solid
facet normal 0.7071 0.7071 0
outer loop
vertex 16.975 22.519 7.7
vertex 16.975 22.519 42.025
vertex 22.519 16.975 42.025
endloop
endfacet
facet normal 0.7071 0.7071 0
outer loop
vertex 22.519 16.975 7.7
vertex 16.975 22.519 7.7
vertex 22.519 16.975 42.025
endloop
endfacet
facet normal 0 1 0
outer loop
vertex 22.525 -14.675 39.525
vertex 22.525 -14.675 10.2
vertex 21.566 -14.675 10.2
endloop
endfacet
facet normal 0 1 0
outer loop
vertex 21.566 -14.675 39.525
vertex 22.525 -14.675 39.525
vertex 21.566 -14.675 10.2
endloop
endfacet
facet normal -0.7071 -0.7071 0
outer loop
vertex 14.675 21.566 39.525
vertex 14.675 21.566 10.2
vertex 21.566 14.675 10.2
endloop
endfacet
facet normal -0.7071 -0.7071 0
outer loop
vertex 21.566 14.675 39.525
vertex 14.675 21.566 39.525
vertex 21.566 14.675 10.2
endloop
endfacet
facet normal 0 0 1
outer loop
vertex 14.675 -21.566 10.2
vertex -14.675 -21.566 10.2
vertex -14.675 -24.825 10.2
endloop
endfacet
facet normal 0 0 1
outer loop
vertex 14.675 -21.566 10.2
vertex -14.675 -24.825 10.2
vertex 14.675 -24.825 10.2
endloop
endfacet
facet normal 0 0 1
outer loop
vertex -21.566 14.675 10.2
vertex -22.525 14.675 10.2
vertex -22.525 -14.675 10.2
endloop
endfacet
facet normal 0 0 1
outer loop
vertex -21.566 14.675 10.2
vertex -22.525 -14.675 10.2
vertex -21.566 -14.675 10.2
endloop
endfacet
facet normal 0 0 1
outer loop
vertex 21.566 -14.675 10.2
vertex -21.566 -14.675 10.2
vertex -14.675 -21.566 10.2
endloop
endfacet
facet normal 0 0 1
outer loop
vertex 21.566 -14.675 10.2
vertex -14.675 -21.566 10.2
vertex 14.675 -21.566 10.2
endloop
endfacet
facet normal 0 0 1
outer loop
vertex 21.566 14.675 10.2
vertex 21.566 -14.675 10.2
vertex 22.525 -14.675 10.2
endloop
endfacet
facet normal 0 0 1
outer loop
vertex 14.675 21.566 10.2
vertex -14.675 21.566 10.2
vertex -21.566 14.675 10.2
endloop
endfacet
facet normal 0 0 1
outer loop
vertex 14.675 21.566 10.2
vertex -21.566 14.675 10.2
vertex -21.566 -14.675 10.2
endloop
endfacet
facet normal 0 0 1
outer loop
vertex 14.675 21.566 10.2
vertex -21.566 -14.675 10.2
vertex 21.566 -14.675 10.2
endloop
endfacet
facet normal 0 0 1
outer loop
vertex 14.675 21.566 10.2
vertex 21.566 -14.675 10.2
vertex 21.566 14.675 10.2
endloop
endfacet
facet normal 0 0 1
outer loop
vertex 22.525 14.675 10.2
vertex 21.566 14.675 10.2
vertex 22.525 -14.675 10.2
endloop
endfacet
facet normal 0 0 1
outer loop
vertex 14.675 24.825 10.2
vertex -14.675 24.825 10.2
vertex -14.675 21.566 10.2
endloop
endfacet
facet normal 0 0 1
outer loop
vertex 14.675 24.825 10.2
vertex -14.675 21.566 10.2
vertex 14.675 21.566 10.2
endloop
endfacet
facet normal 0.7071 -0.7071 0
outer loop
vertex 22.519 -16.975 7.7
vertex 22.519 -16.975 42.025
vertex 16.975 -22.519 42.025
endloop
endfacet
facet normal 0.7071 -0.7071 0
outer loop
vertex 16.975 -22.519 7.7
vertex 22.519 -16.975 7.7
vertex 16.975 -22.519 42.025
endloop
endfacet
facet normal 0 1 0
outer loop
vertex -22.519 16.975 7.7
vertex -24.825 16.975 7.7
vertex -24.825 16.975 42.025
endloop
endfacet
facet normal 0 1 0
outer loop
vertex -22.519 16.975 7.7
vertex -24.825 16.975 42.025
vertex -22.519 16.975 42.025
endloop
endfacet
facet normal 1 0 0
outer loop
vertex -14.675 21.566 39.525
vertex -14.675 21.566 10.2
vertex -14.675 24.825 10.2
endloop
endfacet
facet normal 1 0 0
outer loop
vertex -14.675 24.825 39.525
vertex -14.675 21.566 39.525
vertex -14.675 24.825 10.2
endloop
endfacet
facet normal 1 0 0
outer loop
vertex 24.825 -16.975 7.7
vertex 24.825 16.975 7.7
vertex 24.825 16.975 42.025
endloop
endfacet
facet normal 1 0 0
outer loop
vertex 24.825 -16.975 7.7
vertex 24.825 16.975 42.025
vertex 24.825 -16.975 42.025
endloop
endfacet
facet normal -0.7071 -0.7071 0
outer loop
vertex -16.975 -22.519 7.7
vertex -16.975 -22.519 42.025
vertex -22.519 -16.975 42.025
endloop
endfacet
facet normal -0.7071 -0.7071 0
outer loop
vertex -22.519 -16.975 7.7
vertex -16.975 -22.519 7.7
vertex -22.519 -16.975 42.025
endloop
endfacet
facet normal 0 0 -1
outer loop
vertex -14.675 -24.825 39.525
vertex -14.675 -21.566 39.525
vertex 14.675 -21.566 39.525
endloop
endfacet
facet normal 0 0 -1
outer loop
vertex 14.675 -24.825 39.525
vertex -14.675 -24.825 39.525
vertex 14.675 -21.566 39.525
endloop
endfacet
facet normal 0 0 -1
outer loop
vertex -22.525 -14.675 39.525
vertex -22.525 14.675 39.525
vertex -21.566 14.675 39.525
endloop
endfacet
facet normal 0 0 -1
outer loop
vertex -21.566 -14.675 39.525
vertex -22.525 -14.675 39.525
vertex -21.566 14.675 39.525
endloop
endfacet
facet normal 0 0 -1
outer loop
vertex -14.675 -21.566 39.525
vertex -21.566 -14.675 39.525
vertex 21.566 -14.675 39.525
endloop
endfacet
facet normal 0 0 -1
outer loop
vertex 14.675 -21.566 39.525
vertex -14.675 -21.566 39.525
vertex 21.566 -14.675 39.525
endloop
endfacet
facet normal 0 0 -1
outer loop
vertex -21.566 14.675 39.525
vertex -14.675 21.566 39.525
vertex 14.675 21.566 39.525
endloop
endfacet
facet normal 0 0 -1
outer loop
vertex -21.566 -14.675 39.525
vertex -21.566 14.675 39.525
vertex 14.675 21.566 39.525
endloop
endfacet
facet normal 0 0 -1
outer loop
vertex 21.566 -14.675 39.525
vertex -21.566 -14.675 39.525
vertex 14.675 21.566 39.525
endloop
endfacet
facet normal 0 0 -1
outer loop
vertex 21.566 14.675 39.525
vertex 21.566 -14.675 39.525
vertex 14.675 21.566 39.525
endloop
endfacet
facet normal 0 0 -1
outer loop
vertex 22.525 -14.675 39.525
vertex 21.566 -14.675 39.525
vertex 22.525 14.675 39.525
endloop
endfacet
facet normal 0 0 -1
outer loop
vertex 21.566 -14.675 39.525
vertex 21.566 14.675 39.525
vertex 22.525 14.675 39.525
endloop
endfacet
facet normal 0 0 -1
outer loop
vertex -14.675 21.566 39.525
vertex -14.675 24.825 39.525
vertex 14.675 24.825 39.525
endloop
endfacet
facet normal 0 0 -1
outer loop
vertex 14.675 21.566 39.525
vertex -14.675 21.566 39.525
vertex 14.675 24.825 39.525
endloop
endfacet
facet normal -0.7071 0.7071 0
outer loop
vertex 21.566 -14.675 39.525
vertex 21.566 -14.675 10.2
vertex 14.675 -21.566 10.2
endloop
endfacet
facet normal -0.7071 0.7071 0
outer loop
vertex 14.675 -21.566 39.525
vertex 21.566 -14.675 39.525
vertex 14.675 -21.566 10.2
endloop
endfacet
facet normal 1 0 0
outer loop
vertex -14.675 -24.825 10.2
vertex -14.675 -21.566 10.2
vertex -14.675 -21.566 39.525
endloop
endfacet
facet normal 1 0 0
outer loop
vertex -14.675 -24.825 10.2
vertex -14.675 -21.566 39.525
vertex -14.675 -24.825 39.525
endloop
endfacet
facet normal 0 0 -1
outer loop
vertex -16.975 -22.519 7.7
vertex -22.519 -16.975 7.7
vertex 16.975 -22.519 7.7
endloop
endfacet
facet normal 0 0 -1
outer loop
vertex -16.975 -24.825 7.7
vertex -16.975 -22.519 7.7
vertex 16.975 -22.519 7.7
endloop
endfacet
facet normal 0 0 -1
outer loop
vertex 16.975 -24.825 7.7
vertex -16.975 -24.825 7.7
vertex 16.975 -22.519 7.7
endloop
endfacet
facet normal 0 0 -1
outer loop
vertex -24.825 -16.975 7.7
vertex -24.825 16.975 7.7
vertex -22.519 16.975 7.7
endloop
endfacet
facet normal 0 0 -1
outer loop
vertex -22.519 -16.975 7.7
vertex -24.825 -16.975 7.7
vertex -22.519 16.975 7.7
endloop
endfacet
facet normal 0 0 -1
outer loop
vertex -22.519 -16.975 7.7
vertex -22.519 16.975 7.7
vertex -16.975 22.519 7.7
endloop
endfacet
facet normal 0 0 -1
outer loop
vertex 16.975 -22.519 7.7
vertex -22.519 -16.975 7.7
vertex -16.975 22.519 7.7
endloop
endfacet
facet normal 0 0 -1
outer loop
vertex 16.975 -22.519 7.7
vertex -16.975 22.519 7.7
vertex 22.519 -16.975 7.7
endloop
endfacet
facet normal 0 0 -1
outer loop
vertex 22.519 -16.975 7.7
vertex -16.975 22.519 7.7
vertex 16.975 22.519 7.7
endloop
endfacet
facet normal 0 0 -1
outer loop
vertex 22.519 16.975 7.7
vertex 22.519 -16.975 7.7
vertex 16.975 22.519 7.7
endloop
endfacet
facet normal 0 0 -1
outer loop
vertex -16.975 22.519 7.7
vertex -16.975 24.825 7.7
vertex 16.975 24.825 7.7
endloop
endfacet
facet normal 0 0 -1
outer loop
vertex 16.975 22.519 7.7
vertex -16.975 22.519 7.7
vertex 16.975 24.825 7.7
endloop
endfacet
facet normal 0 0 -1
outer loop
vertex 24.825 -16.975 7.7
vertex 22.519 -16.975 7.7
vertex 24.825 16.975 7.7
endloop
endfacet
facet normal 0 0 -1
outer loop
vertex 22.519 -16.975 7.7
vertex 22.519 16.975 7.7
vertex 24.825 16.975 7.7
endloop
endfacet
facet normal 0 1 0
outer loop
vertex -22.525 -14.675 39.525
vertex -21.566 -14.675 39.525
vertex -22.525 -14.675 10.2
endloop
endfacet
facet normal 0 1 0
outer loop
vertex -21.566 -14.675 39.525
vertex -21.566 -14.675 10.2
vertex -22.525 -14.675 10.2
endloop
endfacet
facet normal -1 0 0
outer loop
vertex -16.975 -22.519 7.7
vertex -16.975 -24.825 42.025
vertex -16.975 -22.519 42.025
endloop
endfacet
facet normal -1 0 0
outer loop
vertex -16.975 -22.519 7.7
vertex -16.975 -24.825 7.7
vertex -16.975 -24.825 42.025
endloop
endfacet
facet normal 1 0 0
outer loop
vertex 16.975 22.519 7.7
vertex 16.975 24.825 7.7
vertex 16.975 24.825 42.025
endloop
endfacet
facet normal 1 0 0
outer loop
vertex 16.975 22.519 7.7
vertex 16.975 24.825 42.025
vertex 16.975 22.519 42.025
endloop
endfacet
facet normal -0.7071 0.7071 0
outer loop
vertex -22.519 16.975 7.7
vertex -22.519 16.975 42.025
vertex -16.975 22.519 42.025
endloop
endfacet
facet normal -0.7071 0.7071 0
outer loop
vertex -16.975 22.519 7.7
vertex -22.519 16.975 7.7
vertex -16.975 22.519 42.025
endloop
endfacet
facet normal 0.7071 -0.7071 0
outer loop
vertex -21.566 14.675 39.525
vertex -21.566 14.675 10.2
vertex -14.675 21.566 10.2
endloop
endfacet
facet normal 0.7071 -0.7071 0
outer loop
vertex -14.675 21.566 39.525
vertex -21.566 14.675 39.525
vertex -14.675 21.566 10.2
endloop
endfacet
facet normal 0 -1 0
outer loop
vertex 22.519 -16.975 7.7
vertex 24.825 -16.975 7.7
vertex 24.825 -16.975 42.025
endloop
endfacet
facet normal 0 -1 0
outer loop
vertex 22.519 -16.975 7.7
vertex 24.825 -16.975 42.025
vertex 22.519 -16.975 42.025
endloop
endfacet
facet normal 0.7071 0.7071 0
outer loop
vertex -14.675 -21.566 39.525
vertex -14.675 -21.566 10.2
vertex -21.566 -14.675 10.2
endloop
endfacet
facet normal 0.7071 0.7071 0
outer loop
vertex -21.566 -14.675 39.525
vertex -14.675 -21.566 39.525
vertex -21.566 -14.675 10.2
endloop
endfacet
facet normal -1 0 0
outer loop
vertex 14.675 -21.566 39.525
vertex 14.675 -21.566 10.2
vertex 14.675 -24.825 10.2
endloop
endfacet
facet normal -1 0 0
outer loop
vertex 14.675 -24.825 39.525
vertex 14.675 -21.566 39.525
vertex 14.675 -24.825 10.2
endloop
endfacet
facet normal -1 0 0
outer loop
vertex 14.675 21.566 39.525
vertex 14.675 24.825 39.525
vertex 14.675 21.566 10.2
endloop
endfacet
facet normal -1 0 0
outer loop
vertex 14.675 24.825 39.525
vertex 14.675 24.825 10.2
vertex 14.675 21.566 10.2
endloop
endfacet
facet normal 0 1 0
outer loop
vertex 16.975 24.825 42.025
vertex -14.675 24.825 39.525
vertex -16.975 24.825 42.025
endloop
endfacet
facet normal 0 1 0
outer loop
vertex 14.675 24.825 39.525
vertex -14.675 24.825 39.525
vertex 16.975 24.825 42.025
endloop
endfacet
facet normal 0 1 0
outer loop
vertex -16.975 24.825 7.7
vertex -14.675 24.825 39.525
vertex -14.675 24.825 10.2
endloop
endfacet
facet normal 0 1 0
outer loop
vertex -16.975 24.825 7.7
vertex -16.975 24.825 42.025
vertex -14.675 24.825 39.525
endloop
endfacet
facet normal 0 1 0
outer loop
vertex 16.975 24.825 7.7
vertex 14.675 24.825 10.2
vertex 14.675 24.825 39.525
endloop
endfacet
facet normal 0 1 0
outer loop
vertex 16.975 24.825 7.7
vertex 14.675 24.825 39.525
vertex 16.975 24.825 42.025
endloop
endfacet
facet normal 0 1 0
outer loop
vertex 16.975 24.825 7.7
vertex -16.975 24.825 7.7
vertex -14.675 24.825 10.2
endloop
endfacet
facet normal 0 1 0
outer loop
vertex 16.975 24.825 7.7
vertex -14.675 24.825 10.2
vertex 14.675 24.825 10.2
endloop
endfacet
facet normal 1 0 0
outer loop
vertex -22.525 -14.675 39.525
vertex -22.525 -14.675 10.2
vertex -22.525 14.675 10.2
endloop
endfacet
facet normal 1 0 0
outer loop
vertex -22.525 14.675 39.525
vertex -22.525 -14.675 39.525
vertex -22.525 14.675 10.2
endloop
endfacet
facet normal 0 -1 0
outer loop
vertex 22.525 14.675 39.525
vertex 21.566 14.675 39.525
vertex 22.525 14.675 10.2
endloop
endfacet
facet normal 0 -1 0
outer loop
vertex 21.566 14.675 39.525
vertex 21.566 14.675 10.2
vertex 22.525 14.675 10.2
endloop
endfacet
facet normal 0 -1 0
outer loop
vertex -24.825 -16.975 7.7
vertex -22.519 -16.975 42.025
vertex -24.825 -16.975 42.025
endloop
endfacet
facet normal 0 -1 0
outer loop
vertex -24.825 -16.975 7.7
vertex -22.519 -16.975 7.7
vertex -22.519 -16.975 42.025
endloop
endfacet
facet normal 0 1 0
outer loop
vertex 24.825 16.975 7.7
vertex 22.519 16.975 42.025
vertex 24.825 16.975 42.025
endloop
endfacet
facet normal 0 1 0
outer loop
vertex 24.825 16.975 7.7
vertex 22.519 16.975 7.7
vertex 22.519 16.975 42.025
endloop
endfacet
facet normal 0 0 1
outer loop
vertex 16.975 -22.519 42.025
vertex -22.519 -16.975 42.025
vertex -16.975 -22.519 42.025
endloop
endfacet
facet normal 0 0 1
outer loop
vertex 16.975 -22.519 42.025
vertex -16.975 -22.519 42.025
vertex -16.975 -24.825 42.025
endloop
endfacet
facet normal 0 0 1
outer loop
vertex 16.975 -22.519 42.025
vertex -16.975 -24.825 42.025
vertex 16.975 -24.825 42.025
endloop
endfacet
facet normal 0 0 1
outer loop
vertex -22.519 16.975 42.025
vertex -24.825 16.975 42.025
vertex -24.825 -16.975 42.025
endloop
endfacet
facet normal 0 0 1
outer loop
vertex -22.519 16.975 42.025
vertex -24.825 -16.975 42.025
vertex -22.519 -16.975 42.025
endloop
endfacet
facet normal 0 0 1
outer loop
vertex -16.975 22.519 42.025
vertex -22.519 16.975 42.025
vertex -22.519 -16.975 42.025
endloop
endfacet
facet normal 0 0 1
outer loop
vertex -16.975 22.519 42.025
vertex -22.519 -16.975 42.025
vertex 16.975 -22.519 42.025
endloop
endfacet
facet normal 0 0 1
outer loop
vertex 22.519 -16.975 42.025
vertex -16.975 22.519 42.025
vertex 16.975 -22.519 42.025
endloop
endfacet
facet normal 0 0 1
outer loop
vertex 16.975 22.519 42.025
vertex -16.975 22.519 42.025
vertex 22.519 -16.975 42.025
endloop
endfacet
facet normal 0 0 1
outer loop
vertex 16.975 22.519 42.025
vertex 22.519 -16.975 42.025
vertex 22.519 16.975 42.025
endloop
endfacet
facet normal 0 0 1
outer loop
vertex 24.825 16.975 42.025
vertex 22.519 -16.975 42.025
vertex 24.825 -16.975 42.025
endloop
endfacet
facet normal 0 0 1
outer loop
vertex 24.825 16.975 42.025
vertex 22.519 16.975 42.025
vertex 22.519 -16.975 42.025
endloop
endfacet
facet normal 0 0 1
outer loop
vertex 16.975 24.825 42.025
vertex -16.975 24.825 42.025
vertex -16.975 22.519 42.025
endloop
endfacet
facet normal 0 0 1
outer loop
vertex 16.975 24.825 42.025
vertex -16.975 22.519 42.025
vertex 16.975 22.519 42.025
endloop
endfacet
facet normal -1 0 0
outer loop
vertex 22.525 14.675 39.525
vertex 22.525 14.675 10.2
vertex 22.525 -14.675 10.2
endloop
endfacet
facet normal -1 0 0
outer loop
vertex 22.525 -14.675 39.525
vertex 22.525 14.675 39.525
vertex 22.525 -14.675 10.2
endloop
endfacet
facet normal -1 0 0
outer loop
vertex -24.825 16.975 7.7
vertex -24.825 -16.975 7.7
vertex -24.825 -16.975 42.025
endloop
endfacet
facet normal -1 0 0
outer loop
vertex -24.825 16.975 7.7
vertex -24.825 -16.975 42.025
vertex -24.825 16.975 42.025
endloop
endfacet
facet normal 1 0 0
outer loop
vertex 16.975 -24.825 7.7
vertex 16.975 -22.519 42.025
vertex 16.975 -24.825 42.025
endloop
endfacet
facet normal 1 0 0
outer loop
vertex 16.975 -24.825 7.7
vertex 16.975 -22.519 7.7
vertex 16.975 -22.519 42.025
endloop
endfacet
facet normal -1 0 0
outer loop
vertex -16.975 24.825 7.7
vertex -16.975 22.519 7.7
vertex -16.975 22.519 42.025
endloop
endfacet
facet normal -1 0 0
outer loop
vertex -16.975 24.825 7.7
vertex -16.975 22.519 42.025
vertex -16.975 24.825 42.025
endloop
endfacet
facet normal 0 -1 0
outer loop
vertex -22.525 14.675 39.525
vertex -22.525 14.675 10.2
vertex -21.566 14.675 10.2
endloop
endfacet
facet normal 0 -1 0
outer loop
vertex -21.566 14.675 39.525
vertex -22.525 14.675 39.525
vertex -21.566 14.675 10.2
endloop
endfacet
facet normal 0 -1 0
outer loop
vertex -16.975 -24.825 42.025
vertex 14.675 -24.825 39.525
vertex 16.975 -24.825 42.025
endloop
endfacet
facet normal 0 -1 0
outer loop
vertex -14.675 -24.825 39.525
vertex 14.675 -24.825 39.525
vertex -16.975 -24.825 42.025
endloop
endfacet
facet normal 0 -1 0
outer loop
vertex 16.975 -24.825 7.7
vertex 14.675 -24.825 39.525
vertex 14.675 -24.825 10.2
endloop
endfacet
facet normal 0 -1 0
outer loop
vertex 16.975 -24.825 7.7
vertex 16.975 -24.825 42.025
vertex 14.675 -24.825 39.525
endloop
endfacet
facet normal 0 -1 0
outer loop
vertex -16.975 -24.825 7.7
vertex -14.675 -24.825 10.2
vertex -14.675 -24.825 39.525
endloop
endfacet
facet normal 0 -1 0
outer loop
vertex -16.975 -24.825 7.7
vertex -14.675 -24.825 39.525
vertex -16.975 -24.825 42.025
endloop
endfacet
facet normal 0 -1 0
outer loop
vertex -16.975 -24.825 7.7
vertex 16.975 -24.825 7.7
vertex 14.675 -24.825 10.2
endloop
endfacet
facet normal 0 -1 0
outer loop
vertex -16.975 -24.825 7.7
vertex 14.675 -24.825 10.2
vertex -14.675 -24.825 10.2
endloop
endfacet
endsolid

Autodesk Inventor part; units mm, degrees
ref_plane "YZ Plane" through (0, 0, 0) normal (1, 0, 0) x (0, 1, 0)
ref_plane "XZ Plane" through (0, 0, 0) normal (0, 1, 0) x (-1, 0, 0)
sketch "Sketch1" plane through (0, 0, 0) normal (0, 0, 1) x (1, 0, 0)
  circle A0 centre (-10, 20.9) radius 1.875 projected
  circle A1 centre (-10, -20.9) radius 1.875 projected
  circle A2 centre (10, 20.9) radius 1.875 projected
  circle A3 centre (10, -20.9) radius 1.875 projected
  circle A4 centre (20.8, -14.4) radius 2.075 projected
  circle A5 centre (20.8, 14.4) radius 2.075 projected
  circle A6 centre (-20.8, 14.4) radius 2.075 projected
  circle A7 centre (-20.8, -14.4) radius 2.075 projected
  line L0 (16.9, -16.9) -> (-16.9, -16.9) projected
  line L1 (-16.9, -16.9) -> (-16.9, 16.9) projected
  line L2 (-16.9, 16.9) -> (16.9, 16.9) projected
  line L3 (16.9, 16.9) -> (16.9, -16.9) projected
  line L4 (-17.05, 24.9) -> (-17.05, 22.55) projected
  line L5 (-17.05, 22.55) -> (-22.55, 17.05) projected
  line L6 (-22.55, 17.05) -> (-24.9, 17.05) projected
  line L7 (-24.9, 17.05) -> (-24.9, -17.05) projected
  line L8 (-24.9, -17.05) -> (-22.55, -17.05) projected
  line L9 (-22.55, -17.05) -> (-17.05, -22.55) projected
  line L10 (-17.05, -22.55) -> (-17.05, -24.9) projected
  line L11 (-17.05, -24.9) -> (17.05, -24.9) projected
  line L12 (17.05, -24.9) -> (17.05, -22.55) projected
  line L13 (17.05, -22.55) -> (22.55, -17.05) projected
  line L14 (22.55, -17.05) -> (24.9, -17.05) projected
  line L15 (24.9, -17.05) -> (24.9, 17.05) projected
  line L16 (24.9, 17.05) -> (22.55, 17.05) projected
  line L17 (22.55, 17.05) -> (17.05, 22.55) projected
  line L18 (17.05, 22.55) -> (17.05, 24.9) projected
  line L19 (17.05, 24.9) -> (-17.05, 24.9) projected
  line L20 (24.825, 16.975) -> (24.825, -16.975)
  line L21 (24.825, -16.975) -> (22.5189, -16.975)
  line L22 (22.5189, -16.975) -> (16.975, -22.5189)
  line L23 (16.975, -22.5189) -> (16.975, -24.825)
  line L24 (16.975, -24.825) -> (-16.975, -24.825)
  line L25 (-16.975, -24.825) -> (-16.975, -22.5189)
  line L26 (-16.975, -22.5189) -> (-22.5189, -16.975)
  line L27 (-22.5189, -16.975) -> (-24.825, -16.975)
  line L28 (-24.825, -16.975) -> (-24.825, 16.975)
  line L29 (-24.825, 16.975) -> (-22.5189, 16.975)
  line L30 (-22.5189, 16.975) -> (-16.975, 22.5189)
  line L31 (-16.975, 22.5189) -> (-16.975, 24.825)
  line L32 (-16.975, 24.825) -> (16.975, 24.825)
  line L33 (16.975, 24.825) -> (16.975, 22.5189)
  line L34 (16.975, 22.5189) -> (22.5189, 16.975)
  line L35 (22.5189, 16.975) -> (24.825, 16.975)
  point P0 (0, 0)
  dimension "d0" = 0.075
ref_plane "Work Plane1" through (-24.9, -24.9, 7.7) normal (0, 0, 1) x (1, 0, 0)
extrude "Extrusion1" add sketch "Sketch1" along normal blind 2.5 from surface at 7.7 contours A0 | A1 | A2 | A3 | A4 | A5 | A6 | A7 | L0 L1 L2 L3 | L20 L21 L22 L23 L24 L25 L26 L27 L28 L29 L30 L31 L32 L33 L34 L35
sketch "Sketch2" plane through (0, 0, 0) normal (0, 0, 1) x (1, 0, 0)
  line L0 (22.5189, 16.975) -> (24.825, 16.975) projected
  line L1 (16.975, 22.5189) -> (22.5189, 16.975) projected
  line L2 (16.975, 24.825) -> (16.975, 22.5189) projected
  line L3 (-16.975, 24.825) -> (16.975, 24.825) projected
  line L4 (-16.975, 22.5189) -> (-16.975, 24.825) projected
  line L5 (-22.5189, 16.975) -> (-16.975, 22.5189) projected
  line L6 (-24.825, 16.975) -> (-22.5189, 16.975) projected
  line L7 (-24.825, -16.975) -> (-24.825, 16.975) projected
  line L8 (-22.5189, -16.975) -> (-24.825, -16.975) projected
  line L9 (-16.975, -22.5189) -> (-22.5189, -16.975) projected
  line L10 (-16.975, -24.825) -> (-16.975, -22.5189) projected
  line L11 (16.975, -24.825) -> (-16.975, -24.825) projected
  line L12 (16.975, -22.5189) -> (16.975, -24.825) projected
  line L13 (22.5189, -16.975) -> (16.975, -22.5189) projected
  line L14 (24.825, -16.975) -> (22.5189, -16.975) projected
  line L15 (24.825, 16.975) -> (24.825, -16.975) projected
  line L16 (24.825, -16.975) -> (22.5189, -16.975)
  line L17 (22.5189, -16.975) -> (22.5189, 16.975)
  line L18 (22.5189, 16.975) -> (24.825, 16.975)
  line L19 (24.825, 16.975) -> (24.825, -16.975)
  line L20 (-22.5189, 16.975) -> (-24.825, 16.975)
  line L21 (-24.825, 16.975) -> (-24.825, -16.975)
  line L22 (-24.825, -16.975) -> (-22.5189, -16.975)
  line L23 (-22.5189, -16.975) -> (-22.5189, 16.975)
  line L24 (22.525, -14.675) -> (21.5662, -14.675)
  line L25 (21.5662, -14.675) -> (14.675, -21.5662)
  line L26 (14.675, -21.5662) -> (14.675, -22.525)
  line L27 (14.675, -22.525) -> (-14.675, -22.525)
  line L28 (-14.675, -22.525) -> (-14.675, -21.5662)
  line L29 (-14.675, -21.5662) -> (-21.5662, -14.675)
  line L30 (-21.5662, -14.675) -> (-22.525, -14.675)
  line L31 (-22.525, -14.675) -> (-22.525, 14.675)
  line L32 (-22.525, 14.675) -> (-21.5662, 14.675)
  line L33 (-21.5662, 14.675) -> (-14.675, 21.5662)
  line L34 (-14.675, 21.5662) -> (-14.675, 22.525)
  line L35 (-14.675, 22.525) -> (14.675, 22.525)
  line L36 (14.675, 22.525) -> (14.675, 21.5662)
  line L37 (14.675, 21.5662) -> (21.5662, 14.675)
  line L38 (21.5662, 14.675) -> (22.525, 14.675)
  line L39 (22.525, 14.675) -> (22.525, -14.675)
  line L40 (14.675, 22.525) -> (14.675, 24.825)
  line L41 (-14.675, 22.525) -> (-14.675, 24.825)
  line L42 (-14.675, -22.525) -> (-14.675, -24.825)
  line L43 (14.675, -22.525) -> (14.675, -24.825)
  point P0 (0, 0)
  dimension "d3" = 2.3
extrude "Extrusion2" add sketch "Sketch2" along normal blind 31.825 from surface at 10.2 contours L17 L38 L37 L36 L40 L3 L2 L1 | L0 L15 L14 L17 L24 L39 L38 | L17 L13 L12 L11 L43 L26 L25 L24 | L41 L34 L33 L32 L23 L5 L4 L3 | L42 L11 L10 L9 L23 L30 L29 L28 | L23 L32 L31 L30 L8 L7 L6
extrude "Extrusion3" add sketch "Sketch2" against normal blind 2.5 from surface at 42.025
properties part number "Tunnel Horizontal"
